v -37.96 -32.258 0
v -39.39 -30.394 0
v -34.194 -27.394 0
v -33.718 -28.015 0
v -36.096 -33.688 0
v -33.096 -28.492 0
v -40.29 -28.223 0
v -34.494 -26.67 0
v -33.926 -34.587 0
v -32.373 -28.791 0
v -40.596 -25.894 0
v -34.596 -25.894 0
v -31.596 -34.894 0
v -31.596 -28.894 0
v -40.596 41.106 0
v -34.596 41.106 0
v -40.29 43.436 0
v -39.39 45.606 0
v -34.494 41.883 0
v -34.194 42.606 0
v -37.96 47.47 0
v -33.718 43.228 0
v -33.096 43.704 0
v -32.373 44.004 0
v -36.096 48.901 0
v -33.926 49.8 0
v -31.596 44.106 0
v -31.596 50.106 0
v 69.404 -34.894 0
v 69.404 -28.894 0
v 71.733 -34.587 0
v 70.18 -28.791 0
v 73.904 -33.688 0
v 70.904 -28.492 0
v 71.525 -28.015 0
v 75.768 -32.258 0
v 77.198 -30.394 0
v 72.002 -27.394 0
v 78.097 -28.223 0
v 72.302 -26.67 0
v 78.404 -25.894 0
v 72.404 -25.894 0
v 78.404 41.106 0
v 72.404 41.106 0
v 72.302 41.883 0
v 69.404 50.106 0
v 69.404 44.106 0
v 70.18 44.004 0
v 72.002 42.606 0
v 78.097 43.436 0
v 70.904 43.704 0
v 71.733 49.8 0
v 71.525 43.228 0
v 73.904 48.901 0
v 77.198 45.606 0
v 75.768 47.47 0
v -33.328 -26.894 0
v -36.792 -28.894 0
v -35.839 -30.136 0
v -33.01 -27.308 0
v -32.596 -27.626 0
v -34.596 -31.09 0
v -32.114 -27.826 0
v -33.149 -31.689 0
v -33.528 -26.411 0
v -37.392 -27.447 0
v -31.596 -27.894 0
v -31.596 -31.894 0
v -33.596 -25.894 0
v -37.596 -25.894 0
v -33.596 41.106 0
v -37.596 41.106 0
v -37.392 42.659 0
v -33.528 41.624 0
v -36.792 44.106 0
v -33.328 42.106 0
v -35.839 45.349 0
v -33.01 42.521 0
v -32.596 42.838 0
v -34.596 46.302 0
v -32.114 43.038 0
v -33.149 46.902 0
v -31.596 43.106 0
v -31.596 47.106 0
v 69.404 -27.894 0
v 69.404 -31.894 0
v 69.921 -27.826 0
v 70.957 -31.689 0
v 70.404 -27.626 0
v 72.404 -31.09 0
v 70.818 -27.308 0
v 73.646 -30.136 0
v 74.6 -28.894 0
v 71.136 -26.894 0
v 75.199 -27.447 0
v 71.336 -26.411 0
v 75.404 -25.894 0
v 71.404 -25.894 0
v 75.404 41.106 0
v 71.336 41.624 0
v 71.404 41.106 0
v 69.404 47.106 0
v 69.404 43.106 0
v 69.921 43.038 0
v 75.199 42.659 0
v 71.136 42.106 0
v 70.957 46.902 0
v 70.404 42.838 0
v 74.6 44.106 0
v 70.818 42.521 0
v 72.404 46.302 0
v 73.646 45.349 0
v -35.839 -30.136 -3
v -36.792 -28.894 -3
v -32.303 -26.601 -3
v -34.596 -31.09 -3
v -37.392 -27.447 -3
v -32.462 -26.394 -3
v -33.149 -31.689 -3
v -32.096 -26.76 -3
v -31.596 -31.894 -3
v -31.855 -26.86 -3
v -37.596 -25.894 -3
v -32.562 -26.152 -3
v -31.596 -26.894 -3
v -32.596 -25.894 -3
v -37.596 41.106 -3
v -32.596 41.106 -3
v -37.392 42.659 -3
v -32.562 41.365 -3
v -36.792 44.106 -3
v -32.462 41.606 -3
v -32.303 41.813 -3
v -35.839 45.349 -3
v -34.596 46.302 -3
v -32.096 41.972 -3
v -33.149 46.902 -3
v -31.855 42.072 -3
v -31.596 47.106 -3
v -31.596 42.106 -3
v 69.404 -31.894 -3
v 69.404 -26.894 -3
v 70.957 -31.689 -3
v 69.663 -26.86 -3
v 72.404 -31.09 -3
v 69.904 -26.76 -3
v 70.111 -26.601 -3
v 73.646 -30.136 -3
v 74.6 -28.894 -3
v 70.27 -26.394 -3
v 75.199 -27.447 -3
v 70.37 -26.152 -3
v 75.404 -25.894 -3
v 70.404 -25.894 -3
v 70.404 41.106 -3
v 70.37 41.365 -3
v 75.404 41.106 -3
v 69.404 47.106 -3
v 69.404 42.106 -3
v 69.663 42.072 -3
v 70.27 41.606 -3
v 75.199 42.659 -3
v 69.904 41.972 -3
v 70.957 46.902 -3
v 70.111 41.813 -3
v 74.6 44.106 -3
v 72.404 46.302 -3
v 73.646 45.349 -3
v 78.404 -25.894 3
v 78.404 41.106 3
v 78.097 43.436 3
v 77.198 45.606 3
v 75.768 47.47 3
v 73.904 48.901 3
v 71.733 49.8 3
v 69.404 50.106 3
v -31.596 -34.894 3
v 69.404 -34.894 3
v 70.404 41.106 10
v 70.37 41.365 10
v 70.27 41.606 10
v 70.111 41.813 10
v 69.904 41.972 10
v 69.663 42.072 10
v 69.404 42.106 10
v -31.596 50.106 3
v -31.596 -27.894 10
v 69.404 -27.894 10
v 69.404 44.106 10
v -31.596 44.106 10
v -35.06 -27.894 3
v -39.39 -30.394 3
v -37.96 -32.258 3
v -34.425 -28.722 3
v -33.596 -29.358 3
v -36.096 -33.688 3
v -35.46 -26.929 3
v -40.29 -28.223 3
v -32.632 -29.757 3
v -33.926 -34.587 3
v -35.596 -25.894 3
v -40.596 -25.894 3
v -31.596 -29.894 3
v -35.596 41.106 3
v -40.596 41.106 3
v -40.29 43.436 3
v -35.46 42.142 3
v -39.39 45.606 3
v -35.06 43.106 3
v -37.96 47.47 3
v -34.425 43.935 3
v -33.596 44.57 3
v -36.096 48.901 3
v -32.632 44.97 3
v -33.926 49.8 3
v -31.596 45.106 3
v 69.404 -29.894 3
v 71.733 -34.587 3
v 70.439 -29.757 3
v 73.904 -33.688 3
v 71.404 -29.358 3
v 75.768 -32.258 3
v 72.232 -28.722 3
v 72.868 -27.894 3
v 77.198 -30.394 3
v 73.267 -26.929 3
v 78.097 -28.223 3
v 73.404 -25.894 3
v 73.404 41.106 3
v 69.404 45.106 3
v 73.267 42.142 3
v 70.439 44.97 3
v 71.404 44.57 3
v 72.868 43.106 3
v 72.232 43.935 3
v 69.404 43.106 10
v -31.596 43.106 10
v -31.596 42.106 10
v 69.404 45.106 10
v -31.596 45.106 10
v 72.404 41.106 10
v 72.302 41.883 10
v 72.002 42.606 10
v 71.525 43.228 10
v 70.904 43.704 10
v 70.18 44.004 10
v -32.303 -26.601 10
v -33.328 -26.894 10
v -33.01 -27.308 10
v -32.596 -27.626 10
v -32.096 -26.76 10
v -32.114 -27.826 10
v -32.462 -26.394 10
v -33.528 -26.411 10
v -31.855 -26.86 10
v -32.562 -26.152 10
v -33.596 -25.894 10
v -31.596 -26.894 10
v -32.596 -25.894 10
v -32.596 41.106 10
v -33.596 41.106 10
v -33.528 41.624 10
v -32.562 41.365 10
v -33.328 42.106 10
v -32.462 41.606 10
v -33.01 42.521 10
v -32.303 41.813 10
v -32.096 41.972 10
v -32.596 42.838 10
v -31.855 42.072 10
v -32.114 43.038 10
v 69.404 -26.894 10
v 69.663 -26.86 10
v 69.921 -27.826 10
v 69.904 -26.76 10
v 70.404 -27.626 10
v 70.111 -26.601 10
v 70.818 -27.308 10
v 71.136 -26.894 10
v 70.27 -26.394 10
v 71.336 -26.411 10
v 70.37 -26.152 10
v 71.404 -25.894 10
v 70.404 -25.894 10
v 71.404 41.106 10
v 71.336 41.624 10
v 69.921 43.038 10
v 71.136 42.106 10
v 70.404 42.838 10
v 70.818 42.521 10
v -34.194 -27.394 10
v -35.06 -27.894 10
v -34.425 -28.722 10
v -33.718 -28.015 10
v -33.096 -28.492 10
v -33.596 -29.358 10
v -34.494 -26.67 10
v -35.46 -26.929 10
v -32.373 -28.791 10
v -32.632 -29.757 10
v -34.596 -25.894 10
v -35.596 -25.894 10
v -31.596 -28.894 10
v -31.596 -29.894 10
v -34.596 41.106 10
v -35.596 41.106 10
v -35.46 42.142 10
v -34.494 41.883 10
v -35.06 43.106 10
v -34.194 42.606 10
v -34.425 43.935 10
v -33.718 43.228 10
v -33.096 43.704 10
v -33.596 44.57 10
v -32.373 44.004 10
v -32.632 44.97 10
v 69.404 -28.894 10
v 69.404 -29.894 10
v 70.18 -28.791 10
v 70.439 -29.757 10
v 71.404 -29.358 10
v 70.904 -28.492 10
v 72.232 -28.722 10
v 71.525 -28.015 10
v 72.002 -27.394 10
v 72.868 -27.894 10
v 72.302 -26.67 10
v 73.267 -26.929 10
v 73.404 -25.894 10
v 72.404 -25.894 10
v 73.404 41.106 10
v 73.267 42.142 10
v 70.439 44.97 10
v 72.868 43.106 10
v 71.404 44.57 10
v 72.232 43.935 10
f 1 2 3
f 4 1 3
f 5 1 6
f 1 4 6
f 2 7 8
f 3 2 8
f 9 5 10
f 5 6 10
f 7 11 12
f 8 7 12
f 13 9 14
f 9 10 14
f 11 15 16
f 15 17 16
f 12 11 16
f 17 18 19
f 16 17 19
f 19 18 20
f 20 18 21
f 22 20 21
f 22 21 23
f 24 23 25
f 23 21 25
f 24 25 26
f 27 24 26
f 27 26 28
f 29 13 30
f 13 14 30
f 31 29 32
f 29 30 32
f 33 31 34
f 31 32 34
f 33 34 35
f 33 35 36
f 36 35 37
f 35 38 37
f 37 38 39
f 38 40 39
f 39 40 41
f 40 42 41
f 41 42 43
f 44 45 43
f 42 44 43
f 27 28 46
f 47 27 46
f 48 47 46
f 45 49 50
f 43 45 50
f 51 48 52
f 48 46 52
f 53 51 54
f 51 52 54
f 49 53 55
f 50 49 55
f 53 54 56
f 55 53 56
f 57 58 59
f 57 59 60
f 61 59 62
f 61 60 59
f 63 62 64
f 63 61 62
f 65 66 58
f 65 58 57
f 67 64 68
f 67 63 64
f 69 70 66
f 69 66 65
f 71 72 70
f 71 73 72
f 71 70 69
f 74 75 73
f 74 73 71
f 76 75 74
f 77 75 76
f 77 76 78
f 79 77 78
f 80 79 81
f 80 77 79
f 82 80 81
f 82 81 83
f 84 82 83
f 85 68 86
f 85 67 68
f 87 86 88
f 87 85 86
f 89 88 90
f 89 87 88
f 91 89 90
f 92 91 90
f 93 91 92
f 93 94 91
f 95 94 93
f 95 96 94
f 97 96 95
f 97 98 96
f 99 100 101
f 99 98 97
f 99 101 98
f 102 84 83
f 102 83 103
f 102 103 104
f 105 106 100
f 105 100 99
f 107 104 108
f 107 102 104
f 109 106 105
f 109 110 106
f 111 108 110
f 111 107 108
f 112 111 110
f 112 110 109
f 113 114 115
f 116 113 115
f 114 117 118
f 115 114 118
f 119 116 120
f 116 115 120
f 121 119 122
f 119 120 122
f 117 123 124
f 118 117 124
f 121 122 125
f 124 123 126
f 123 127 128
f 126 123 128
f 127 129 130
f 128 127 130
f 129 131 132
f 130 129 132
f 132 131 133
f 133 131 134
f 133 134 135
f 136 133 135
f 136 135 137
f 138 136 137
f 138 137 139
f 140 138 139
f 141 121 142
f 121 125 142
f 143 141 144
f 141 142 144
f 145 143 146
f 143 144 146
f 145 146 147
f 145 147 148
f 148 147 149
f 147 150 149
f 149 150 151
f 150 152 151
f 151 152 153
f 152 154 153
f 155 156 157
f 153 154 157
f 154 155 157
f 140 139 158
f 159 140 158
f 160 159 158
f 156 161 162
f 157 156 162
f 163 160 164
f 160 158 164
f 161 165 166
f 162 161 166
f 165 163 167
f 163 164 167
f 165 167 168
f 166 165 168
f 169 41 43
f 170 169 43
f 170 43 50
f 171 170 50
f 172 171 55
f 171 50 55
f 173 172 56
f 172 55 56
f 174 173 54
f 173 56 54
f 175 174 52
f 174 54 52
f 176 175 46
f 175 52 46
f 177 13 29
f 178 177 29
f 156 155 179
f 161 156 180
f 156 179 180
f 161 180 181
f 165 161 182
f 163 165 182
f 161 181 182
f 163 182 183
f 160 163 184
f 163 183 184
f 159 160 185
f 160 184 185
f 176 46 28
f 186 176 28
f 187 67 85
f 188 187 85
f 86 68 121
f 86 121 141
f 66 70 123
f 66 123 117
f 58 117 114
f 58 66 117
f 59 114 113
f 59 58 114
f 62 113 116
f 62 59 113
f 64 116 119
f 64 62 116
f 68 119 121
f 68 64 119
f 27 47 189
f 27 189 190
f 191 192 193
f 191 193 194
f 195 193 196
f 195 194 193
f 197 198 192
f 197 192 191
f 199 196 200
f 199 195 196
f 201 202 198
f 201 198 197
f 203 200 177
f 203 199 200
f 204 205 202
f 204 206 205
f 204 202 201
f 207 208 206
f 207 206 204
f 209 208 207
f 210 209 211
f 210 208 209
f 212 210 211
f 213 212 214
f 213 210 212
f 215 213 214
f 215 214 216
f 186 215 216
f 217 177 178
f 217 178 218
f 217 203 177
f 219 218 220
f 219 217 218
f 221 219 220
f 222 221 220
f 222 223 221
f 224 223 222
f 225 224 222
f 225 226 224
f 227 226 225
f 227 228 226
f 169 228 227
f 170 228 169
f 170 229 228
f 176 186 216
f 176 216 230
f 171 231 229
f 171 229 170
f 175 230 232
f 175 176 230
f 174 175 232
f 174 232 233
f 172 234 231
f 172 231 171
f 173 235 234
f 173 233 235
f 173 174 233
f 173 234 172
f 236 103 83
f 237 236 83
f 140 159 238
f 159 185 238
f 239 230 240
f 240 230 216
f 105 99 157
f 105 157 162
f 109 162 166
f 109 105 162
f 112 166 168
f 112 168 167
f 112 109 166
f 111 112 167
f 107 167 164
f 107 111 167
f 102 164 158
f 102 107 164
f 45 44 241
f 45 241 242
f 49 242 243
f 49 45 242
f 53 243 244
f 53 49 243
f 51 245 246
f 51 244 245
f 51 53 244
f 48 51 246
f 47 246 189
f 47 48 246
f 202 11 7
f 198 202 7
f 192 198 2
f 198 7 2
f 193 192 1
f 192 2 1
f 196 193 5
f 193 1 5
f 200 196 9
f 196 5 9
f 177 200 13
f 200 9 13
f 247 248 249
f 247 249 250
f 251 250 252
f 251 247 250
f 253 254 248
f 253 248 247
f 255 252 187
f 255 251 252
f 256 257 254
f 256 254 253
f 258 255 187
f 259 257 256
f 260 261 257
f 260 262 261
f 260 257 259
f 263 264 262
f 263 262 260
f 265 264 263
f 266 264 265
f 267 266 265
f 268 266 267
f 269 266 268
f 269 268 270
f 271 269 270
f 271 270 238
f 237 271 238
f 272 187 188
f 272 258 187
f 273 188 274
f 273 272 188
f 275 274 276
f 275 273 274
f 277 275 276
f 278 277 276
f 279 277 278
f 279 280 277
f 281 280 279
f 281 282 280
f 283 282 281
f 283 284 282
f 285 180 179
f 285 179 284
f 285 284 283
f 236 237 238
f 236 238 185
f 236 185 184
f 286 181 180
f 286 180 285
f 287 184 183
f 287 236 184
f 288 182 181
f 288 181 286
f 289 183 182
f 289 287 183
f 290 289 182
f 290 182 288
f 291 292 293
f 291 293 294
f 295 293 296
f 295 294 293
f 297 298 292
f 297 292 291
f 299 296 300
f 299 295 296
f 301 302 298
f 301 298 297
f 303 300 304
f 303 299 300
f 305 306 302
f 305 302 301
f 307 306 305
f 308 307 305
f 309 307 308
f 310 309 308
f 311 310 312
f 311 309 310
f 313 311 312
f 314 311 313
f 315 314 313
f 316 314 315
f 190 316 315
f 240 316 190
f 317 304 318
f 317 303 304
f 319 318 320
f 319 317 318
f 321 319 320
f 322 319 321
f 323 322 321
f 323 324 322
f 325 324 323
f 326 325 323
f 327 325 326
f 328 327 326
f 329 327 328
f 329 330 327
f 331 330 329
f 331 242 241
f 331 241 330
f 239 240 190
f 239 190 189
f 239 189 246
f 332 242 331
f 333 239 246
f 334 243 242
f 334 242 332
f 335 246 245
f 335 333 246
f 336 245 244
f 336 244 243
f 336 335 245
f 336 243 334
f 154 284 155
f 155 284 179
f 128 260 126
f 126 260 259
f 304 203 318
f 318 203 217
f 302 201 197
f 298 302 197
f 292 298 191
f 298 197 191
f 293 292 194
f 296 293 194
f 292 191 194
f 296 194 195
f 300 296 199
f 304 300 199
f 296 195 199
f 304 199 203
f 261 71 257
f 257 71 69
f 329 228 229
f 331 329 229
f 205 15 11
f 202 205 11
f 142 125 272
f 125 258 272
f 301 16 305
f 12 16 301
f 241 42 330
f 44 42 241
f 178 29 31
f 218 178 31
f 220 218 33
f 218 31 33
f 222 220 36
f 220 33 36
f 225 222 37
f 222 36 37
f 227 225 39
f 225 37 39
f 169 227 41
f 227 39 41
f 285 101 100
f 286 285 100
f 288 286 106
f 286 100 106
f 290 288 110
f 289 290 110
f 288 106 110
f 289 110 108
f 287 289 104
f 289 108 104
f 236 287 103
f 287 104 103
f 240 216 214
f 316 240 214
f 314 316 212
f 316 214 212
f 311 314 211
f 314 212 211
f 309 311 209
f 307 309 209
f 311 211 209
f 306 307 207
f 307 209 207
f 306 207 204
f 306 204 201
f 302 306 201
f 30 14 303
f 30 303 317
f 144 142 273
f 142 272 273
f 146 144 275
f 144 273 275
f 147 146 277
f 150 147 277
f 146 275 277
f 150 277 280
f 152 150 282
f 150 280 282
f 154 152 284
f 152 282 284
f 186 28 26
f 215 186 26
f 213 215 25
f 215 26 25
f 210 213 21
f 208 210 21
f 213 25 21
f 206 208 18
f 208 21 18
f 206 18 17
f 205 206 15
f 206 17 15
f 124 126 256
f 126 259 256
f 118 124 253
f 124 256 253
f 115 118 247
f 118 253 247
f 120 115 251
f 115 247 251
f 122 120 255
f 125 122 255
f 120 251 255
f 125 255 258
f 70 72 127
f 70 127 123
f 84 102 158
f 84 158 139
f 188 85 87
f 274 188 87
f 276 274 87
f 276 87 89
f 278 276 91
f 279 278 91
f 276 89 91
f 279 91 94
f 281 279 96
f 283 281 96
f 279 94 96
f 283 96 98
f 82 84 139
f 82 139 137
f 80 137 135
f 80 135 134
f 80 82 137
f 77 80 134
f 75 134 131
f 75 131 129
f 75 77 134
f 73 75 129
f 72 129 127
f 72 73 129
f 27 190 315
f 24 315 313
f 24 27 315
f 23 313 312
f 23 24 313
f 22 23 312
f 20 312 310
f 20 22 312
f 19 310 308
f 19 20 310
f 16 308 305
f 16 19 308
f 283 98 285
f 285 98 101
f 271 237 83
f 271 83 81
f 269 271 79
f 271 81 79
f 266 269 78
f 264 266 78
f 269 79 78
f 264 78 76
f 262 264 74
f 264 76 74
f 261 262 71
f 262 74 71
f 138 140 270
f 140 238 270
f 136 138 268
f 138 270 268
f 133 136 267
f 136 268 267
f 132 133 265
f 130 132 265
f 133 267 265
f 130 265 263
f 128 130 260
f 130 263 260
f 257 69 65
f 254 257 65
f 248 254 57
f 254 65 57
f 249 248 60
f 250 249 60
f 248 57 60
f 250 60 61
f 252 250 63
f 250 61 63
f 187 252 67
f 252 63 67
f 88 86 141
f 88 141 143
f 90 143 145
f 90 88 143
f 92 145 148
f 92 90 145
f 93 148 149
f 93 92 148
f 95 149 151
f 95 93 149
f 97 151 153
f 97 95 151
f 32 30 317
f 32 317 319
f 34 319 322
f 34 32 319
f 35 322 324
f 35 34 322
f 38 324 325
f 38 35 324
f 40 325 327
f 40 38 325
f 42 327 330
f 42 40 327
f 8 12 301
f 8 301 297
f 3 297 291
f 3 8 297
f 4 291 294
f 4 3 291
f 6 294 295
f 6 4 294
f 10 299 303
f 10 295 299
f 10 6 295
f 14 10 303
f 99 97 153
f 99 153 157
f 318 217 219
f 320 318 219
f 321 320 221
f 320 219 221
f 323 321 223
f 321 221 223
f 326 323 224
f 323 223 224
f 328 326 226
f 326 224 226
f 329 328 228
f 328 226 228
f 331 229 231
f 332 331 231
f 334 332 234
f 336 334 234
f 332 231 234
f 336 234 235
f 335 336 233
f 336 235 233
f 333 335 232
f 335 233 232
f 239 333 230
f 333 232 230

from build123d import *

# Parameters (mm, degrees)
PAD_DEPTH    = 3
PAD001_DEPTH = 10
POCKET_DEPTH = 10.001
PAD002_DEPTH = 10
PAD003_DEPTH = 3


with BuildPart() as body:
    # Sketch004 → Pad (new body)
    with BuildSketch(Plane.XY):
        with BuildLine():
            Line((-40.596243, 41.106321), (-40.596243, -25.893679))
            ThreePointArc((-40.596243, -25.893679), (-37.960204, -32.25764), (-31.596243, -34.893679))
            Line((-31.596243, -34.893679), (69.403757, -34.893679))
            ThreePointArc((69.403757, -34.893679), (75.767718, -32.25764), (78.403757, -25.893679))
            Line((78.403757, -25.893679), (78.403757, 41.106321))
            ThreePointArc((78.403757, 41.106321), (75.767718, 47.470282), (69.403757, 50.106321))
            Line((69.403757, 50.106321), (-31.596243, 50.106321))
            ThreePointArc((-31.596243, 50.106321), (-37.960204, 47.470282), (-40.596243, 41.106321))
        make_face()
        with BuildLine():
            Line((-35.596243, 41.106321), (-35.596243, -25.893679))
            ThreePointArc((-35.596243, -25.893679), (-34.42467, -28.722106), (-31.596243, -29.893679))
            Line((-31.596243, -29.893679), (69.403757, -29.893679))
            ThreePointArc((69.403757, -29.893679), (72.232184, -28.722106), (73.403757, -25.893679))
            Line((73.403757, -25.893679), (73.403757, 41.106321))
            ThreePointArc((73.403757, 41.106321), (72.232184, 43.934748), (69.403757, 45.106321))
            Line((69.403757, 45.106321), (-31.596243, 45.106321))
            ThreePointArc((-31.596243, 45.106321), (-34.42467, 43.934748), (-35.596243, 41.106321))
        make_face(mode=Mode.SUBTRACT)
    extrude(amount=PAD_DEPTH)

    # Sketch003 → Pad001 (join)
    with BuildSketch(Plane.XY):
        with BuildLine():
            Line((-35.596243, 41.106321), (-35.596243, -25.893679))
            ThreePointArc((-35.596243, -25.893679), (-34.42467, -28.722106), (-31.596243, -29.893679))
            Line((-31.596243, -29.893679), (69.403757, -29.893679))
            ThreePointArc((69.403757, -29.893679), (72.232184, -28.722106), (73.403757, -25.893679))
            Line((73.403757, -25.893679), (73.403757, 41.106321))
            ThreePointArc((73.403757, 41.106321), (72.232184, 43.934748), (69.403757, 45.106321))
            Line((69.403757, 45.106321), (-31.596243, 45.106321))
            ThreePointArc((-31.596243, 45.106321), (-34.42467, 43.934748), (-35.596243, 41.106321))
        make_face()
    extrude(amount=PAD001_DEPTH)

    # Sketch005 → Pocket (cut, through all)
    with BuildSketch(Plane(origin=(0, 0, 0), x_dir=(-1, 0, 0), z_dir=(0, 0, 1))):
        with BuildLine():
            Line((34.596243, -41.106321), (34.596243, 25.893679))
            ThreePointArc((34.596243, 25.893679), (33.717563, 28.014999), (31.596243, 28.893679))
            Line((31.596243, 28.893679), (-69.403757, 28.893679))
            ThreePointArc((-69.403757, 28.893679), (-71.525078, 28.014999), (-72.403757, 25.893679))
            Line((-72.403757, 25.893679), (-72.403757, -41.106321))
            ThreePointArc((-72.403757, -41.106321), (-71.525078, -43.227641), (-69.403757, -44.106321))
            Line((-69.403757, -44.106321), (31.596243, -44.106321))
            ThreePointArc((31.596243, -44.106321), (33.717563, -43.227641), (34.596243, -41.106321))
        make_face()
    extrude(amount=POCKET_DEPTH, mode=Mode.SUBTRACT)


with BuildPart() as body001:
    # Sketch009 → Pad002 (new body)
    with BuildSketch(Plane.XY):
        with BuildLine():
            Line((-33.596243, 41.106321), (-33.596243, -25.893679))
            ThreePointArc((-33.596243, -25.893679), (-33.010456, -27.307893), (-31.596243, -27.893679))
            Line((-31.596243, -27.893679), (69.403757, -27.893679))
            ThreePointArc((69.403757, -27.893679), (70.817971, -27.307893), (71.403757, -25.893679))
            Line((71.403757, -25.893679), (71.403757, 41.106321))
            ThreePointArc((71.403757, 41.106321), (70.817971, 42.520534), (69.403757, 43.106321))
            Line((69.403757, 43.106321), (-31.596243, 43.106321))
            ThreePointArc((-31.596243, 43.106321), (-33.010456, 42.520534), (-33.596243, 41.106321))
        make_face()
        with BuildLine():
            Line((-32.596243, 41.106321), (-32.596243, -25.893679))
            ThreePointArc((-32.596243, -25.893679), (-32.30335, -26.600786), (-31.596243, -26.893679))
            Line((-31.596243, -26.893679), (69.403757, -26.893679))
            ThreePointArc((69.403757, -26.893679), (70.110864, -26.600786), (70.403757, -25.893679))
            Line((70.403757, -25.893679), (70.403757, 41.106321))
            ThreePointArc((70.403757, 41.106321), (70.110864, 41.813428), (69.403757, 42.106321))
            Line((69.403757, 42.106321), (-31.596243, 42.106321))
            ThreePointArc((-31.596243, 42.106321), (-32.30335, 41.813428), (-32.596243, 41.106321))
        make_face(mode=Mode.SUBTRACT)
    extrude(amount=PAD002_DEPTH)

    # Sketch011 → Pad003 (join)
    with BuildSketch(Plane.XY):
        with BuildLine():
            Line((-37.596243, 41.106321), (-37.596243, -25.893679))
            ThreePointArc((-37.596243, -25.893679), (-35.838883, -30.13632), (-31.596243, -31.893679))
            Line((-31.596243, -31.893679), (69.403757, -31.893679))
            ThreePointArc((69.403757, -31.893679), (73.646398, -30.13632), (75.403757, -25.893679))
            Line((75.403757, -25.893679), (75.403757, 41.106321))
            ThreePointArc((75.403757, 41.106321), (73.646398, 45.348962), (69.403757, 47.106321))
            Line((69.403757, 47.106321), (-31.596243, 47.106321))
            ThreePointArc((-31.596243, 47.106321), (-35.838883, 45.348962), (-37.596243, 41.106321))
        make_face()
        with BuildLine():
            Line((-32.596243, 41.106321), (-32.596243, -25.893679))
            ThreePointArc((-32.596243, -25.893679), (-32.30335, -26.600786), (-31.596243, -26.893679))
            Line((-31.596243, -26.893679), (69.403757, -26.893679))
            ThreePointArc((69.403757, -26.893679), (70.110864, -26.600786), (70.403757, -25.893679))
            Line((70.403757, -25.893679), (70.403757, 41.106321))
            ThreePointArc((70.403757, 41.106321), (70.110864, 41.813428), (69.403757, 42.106321))
            Line((69.403757, 42.106321), (-31.596243, 42.106321))
            ThreePointArc((-31.596243, 42.106321), (-32.30335, 41.813428), (-32.596243, 41.106321))
        make_face(mode=Mode.SUBTRACT)
    extrude(amount=-PAD003_DEPTH)


solid = Compound([body.part, body001.part])
